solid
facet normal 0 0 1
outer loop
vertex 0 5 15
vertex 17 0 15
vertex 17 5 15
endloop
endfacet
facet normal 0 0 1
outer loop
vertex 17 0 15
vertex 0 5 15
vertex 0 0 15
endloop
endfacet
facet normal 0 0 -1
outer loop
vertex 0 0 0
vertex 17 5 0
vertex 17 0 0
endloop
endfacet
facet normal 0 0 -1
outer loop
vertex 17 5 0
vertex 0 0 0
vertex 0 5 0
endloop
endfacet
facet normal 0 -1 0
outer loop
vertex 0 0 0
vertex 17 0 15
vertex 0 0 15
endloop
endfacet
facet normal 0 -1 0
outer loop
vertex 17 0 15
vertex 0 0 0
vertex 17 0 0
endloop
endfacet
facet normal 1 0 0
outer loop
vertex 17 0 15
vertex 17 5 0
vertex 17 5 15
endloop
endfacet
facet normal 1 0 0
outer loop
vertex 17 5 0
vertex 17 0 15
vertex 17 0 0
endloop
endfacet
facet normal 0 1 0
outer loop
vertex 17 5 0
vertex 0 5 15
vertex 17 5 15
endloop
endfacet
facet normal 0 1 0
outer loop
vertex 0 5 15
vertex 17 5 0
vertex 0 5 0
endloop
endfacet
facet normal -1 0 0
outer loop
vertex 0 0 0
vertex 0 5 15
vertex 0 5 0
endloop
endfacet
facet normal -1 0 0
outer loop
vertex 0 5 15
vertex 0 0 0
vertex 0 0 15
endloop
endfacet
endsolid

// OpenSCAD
// Generated by SolidPython 1.0.1 on 2020-07-29 00:46:56


cube(size = [17, 5, 15]);
/***********************************************
*********      SolidPython code:      **********
************************************************
 
# import packages: SolidPython
from solid import *
from solid.utils import *
from itertools import chain, combinations, permutations


class Resize:

    def __init__(self, scad_file):
        self.scad_file = scad_file
        #self.scad_file = import_scad(scad_file)
        # cone/cylinder param:
        self.r1 = 0
        self.r2 = 0
        self.h = 0
        # rectangular prism param:
        self.w = 0
        self.l = 0
        # ellipse param:
        self.r = 0

    # import OpenScad code (file name corresponds to shape)


    # classify shape + parameters
    def assign(self, param1, param2, param3):
        if self.scad_file == 'cone.scad':
            self.r1 = param1
            self.r2 = param2
            self.h = param3
        elif self.scad_file == 'cylinder.scad':
            self.r1 = param1
            self.r2 = param2
            self.h = param3
        elif self.scad_file == 'rectangularPrism.scad':
            self.h = param1
            self.l = param2
            self.w = param3
        else:
            self.r = param1
            self.h = param2

    # resize parameters
    def iterate(self):
        x = range(3, 20, 2)
        i = 1
        if self.scad_file == 'cone.scad':
            tempList = list(permutations(x, 2))
            for temp in tempList:
                param1 = temp[0]
                param2 = temp[1]
                filepath = 'produced_scad_files/' + 'cone' + str(param1) + '_' + str(param2) + '_' + '.scad'
                scad_render_to_file(cylinder(h=param1, r1=param2, r2=0), filepath)

        elif self.scad_file == 'cylinder.scad':
            tempList = list(permutations(x, 3))
            for temp in tempList:
                param1 = temp[0]
                param2 = temp[1]
                filepath = 'produced_scad_files/' + 'cylinder' + str(param1) + '_' + str(param2) + '_' + '.scad'
                scad_render_to_file(cylinder(h=param1, r1=param2, r2=param2), filepath)

        elif self.scad_file == 'rectangularPrism.scad':
            tempList = list(permutations(x, 3))
            for temp in tempList:
                param1 = temp[0]
                param2 = temp[1]
                param3 = temp[2]
                filepath = 'produced_scad_files/' + 'rectangularPrism' + str(param1) + '_' + str(param2) + '_' + str(
                    param3) + '.scad'
                scad_render_to_file(cube(size=(param1, param2, param3)), filepath)

        elif self.scad_file == 'ellipse.scad':
            tempList = list(permutations(x, 4))
            for temp in tempList:
                param1 = temp[0]
                param2 = temp[1]
                param3 = temp[2]
                param4 = temp[3]
                filepath = 'produced_scad_files/' + 'ellipse' + str(param1) + '_' + str(param2) + '_' + str(param3) + '_' + str(param4) + '.scad'
                scad_render_to_file(scale([param1, param2, param3])(sphere(r=param4)), filepath)

    def render_to_scadfile(self):
        scad_render_to_file(scad, 'example.scad') 
 
************************************************/
